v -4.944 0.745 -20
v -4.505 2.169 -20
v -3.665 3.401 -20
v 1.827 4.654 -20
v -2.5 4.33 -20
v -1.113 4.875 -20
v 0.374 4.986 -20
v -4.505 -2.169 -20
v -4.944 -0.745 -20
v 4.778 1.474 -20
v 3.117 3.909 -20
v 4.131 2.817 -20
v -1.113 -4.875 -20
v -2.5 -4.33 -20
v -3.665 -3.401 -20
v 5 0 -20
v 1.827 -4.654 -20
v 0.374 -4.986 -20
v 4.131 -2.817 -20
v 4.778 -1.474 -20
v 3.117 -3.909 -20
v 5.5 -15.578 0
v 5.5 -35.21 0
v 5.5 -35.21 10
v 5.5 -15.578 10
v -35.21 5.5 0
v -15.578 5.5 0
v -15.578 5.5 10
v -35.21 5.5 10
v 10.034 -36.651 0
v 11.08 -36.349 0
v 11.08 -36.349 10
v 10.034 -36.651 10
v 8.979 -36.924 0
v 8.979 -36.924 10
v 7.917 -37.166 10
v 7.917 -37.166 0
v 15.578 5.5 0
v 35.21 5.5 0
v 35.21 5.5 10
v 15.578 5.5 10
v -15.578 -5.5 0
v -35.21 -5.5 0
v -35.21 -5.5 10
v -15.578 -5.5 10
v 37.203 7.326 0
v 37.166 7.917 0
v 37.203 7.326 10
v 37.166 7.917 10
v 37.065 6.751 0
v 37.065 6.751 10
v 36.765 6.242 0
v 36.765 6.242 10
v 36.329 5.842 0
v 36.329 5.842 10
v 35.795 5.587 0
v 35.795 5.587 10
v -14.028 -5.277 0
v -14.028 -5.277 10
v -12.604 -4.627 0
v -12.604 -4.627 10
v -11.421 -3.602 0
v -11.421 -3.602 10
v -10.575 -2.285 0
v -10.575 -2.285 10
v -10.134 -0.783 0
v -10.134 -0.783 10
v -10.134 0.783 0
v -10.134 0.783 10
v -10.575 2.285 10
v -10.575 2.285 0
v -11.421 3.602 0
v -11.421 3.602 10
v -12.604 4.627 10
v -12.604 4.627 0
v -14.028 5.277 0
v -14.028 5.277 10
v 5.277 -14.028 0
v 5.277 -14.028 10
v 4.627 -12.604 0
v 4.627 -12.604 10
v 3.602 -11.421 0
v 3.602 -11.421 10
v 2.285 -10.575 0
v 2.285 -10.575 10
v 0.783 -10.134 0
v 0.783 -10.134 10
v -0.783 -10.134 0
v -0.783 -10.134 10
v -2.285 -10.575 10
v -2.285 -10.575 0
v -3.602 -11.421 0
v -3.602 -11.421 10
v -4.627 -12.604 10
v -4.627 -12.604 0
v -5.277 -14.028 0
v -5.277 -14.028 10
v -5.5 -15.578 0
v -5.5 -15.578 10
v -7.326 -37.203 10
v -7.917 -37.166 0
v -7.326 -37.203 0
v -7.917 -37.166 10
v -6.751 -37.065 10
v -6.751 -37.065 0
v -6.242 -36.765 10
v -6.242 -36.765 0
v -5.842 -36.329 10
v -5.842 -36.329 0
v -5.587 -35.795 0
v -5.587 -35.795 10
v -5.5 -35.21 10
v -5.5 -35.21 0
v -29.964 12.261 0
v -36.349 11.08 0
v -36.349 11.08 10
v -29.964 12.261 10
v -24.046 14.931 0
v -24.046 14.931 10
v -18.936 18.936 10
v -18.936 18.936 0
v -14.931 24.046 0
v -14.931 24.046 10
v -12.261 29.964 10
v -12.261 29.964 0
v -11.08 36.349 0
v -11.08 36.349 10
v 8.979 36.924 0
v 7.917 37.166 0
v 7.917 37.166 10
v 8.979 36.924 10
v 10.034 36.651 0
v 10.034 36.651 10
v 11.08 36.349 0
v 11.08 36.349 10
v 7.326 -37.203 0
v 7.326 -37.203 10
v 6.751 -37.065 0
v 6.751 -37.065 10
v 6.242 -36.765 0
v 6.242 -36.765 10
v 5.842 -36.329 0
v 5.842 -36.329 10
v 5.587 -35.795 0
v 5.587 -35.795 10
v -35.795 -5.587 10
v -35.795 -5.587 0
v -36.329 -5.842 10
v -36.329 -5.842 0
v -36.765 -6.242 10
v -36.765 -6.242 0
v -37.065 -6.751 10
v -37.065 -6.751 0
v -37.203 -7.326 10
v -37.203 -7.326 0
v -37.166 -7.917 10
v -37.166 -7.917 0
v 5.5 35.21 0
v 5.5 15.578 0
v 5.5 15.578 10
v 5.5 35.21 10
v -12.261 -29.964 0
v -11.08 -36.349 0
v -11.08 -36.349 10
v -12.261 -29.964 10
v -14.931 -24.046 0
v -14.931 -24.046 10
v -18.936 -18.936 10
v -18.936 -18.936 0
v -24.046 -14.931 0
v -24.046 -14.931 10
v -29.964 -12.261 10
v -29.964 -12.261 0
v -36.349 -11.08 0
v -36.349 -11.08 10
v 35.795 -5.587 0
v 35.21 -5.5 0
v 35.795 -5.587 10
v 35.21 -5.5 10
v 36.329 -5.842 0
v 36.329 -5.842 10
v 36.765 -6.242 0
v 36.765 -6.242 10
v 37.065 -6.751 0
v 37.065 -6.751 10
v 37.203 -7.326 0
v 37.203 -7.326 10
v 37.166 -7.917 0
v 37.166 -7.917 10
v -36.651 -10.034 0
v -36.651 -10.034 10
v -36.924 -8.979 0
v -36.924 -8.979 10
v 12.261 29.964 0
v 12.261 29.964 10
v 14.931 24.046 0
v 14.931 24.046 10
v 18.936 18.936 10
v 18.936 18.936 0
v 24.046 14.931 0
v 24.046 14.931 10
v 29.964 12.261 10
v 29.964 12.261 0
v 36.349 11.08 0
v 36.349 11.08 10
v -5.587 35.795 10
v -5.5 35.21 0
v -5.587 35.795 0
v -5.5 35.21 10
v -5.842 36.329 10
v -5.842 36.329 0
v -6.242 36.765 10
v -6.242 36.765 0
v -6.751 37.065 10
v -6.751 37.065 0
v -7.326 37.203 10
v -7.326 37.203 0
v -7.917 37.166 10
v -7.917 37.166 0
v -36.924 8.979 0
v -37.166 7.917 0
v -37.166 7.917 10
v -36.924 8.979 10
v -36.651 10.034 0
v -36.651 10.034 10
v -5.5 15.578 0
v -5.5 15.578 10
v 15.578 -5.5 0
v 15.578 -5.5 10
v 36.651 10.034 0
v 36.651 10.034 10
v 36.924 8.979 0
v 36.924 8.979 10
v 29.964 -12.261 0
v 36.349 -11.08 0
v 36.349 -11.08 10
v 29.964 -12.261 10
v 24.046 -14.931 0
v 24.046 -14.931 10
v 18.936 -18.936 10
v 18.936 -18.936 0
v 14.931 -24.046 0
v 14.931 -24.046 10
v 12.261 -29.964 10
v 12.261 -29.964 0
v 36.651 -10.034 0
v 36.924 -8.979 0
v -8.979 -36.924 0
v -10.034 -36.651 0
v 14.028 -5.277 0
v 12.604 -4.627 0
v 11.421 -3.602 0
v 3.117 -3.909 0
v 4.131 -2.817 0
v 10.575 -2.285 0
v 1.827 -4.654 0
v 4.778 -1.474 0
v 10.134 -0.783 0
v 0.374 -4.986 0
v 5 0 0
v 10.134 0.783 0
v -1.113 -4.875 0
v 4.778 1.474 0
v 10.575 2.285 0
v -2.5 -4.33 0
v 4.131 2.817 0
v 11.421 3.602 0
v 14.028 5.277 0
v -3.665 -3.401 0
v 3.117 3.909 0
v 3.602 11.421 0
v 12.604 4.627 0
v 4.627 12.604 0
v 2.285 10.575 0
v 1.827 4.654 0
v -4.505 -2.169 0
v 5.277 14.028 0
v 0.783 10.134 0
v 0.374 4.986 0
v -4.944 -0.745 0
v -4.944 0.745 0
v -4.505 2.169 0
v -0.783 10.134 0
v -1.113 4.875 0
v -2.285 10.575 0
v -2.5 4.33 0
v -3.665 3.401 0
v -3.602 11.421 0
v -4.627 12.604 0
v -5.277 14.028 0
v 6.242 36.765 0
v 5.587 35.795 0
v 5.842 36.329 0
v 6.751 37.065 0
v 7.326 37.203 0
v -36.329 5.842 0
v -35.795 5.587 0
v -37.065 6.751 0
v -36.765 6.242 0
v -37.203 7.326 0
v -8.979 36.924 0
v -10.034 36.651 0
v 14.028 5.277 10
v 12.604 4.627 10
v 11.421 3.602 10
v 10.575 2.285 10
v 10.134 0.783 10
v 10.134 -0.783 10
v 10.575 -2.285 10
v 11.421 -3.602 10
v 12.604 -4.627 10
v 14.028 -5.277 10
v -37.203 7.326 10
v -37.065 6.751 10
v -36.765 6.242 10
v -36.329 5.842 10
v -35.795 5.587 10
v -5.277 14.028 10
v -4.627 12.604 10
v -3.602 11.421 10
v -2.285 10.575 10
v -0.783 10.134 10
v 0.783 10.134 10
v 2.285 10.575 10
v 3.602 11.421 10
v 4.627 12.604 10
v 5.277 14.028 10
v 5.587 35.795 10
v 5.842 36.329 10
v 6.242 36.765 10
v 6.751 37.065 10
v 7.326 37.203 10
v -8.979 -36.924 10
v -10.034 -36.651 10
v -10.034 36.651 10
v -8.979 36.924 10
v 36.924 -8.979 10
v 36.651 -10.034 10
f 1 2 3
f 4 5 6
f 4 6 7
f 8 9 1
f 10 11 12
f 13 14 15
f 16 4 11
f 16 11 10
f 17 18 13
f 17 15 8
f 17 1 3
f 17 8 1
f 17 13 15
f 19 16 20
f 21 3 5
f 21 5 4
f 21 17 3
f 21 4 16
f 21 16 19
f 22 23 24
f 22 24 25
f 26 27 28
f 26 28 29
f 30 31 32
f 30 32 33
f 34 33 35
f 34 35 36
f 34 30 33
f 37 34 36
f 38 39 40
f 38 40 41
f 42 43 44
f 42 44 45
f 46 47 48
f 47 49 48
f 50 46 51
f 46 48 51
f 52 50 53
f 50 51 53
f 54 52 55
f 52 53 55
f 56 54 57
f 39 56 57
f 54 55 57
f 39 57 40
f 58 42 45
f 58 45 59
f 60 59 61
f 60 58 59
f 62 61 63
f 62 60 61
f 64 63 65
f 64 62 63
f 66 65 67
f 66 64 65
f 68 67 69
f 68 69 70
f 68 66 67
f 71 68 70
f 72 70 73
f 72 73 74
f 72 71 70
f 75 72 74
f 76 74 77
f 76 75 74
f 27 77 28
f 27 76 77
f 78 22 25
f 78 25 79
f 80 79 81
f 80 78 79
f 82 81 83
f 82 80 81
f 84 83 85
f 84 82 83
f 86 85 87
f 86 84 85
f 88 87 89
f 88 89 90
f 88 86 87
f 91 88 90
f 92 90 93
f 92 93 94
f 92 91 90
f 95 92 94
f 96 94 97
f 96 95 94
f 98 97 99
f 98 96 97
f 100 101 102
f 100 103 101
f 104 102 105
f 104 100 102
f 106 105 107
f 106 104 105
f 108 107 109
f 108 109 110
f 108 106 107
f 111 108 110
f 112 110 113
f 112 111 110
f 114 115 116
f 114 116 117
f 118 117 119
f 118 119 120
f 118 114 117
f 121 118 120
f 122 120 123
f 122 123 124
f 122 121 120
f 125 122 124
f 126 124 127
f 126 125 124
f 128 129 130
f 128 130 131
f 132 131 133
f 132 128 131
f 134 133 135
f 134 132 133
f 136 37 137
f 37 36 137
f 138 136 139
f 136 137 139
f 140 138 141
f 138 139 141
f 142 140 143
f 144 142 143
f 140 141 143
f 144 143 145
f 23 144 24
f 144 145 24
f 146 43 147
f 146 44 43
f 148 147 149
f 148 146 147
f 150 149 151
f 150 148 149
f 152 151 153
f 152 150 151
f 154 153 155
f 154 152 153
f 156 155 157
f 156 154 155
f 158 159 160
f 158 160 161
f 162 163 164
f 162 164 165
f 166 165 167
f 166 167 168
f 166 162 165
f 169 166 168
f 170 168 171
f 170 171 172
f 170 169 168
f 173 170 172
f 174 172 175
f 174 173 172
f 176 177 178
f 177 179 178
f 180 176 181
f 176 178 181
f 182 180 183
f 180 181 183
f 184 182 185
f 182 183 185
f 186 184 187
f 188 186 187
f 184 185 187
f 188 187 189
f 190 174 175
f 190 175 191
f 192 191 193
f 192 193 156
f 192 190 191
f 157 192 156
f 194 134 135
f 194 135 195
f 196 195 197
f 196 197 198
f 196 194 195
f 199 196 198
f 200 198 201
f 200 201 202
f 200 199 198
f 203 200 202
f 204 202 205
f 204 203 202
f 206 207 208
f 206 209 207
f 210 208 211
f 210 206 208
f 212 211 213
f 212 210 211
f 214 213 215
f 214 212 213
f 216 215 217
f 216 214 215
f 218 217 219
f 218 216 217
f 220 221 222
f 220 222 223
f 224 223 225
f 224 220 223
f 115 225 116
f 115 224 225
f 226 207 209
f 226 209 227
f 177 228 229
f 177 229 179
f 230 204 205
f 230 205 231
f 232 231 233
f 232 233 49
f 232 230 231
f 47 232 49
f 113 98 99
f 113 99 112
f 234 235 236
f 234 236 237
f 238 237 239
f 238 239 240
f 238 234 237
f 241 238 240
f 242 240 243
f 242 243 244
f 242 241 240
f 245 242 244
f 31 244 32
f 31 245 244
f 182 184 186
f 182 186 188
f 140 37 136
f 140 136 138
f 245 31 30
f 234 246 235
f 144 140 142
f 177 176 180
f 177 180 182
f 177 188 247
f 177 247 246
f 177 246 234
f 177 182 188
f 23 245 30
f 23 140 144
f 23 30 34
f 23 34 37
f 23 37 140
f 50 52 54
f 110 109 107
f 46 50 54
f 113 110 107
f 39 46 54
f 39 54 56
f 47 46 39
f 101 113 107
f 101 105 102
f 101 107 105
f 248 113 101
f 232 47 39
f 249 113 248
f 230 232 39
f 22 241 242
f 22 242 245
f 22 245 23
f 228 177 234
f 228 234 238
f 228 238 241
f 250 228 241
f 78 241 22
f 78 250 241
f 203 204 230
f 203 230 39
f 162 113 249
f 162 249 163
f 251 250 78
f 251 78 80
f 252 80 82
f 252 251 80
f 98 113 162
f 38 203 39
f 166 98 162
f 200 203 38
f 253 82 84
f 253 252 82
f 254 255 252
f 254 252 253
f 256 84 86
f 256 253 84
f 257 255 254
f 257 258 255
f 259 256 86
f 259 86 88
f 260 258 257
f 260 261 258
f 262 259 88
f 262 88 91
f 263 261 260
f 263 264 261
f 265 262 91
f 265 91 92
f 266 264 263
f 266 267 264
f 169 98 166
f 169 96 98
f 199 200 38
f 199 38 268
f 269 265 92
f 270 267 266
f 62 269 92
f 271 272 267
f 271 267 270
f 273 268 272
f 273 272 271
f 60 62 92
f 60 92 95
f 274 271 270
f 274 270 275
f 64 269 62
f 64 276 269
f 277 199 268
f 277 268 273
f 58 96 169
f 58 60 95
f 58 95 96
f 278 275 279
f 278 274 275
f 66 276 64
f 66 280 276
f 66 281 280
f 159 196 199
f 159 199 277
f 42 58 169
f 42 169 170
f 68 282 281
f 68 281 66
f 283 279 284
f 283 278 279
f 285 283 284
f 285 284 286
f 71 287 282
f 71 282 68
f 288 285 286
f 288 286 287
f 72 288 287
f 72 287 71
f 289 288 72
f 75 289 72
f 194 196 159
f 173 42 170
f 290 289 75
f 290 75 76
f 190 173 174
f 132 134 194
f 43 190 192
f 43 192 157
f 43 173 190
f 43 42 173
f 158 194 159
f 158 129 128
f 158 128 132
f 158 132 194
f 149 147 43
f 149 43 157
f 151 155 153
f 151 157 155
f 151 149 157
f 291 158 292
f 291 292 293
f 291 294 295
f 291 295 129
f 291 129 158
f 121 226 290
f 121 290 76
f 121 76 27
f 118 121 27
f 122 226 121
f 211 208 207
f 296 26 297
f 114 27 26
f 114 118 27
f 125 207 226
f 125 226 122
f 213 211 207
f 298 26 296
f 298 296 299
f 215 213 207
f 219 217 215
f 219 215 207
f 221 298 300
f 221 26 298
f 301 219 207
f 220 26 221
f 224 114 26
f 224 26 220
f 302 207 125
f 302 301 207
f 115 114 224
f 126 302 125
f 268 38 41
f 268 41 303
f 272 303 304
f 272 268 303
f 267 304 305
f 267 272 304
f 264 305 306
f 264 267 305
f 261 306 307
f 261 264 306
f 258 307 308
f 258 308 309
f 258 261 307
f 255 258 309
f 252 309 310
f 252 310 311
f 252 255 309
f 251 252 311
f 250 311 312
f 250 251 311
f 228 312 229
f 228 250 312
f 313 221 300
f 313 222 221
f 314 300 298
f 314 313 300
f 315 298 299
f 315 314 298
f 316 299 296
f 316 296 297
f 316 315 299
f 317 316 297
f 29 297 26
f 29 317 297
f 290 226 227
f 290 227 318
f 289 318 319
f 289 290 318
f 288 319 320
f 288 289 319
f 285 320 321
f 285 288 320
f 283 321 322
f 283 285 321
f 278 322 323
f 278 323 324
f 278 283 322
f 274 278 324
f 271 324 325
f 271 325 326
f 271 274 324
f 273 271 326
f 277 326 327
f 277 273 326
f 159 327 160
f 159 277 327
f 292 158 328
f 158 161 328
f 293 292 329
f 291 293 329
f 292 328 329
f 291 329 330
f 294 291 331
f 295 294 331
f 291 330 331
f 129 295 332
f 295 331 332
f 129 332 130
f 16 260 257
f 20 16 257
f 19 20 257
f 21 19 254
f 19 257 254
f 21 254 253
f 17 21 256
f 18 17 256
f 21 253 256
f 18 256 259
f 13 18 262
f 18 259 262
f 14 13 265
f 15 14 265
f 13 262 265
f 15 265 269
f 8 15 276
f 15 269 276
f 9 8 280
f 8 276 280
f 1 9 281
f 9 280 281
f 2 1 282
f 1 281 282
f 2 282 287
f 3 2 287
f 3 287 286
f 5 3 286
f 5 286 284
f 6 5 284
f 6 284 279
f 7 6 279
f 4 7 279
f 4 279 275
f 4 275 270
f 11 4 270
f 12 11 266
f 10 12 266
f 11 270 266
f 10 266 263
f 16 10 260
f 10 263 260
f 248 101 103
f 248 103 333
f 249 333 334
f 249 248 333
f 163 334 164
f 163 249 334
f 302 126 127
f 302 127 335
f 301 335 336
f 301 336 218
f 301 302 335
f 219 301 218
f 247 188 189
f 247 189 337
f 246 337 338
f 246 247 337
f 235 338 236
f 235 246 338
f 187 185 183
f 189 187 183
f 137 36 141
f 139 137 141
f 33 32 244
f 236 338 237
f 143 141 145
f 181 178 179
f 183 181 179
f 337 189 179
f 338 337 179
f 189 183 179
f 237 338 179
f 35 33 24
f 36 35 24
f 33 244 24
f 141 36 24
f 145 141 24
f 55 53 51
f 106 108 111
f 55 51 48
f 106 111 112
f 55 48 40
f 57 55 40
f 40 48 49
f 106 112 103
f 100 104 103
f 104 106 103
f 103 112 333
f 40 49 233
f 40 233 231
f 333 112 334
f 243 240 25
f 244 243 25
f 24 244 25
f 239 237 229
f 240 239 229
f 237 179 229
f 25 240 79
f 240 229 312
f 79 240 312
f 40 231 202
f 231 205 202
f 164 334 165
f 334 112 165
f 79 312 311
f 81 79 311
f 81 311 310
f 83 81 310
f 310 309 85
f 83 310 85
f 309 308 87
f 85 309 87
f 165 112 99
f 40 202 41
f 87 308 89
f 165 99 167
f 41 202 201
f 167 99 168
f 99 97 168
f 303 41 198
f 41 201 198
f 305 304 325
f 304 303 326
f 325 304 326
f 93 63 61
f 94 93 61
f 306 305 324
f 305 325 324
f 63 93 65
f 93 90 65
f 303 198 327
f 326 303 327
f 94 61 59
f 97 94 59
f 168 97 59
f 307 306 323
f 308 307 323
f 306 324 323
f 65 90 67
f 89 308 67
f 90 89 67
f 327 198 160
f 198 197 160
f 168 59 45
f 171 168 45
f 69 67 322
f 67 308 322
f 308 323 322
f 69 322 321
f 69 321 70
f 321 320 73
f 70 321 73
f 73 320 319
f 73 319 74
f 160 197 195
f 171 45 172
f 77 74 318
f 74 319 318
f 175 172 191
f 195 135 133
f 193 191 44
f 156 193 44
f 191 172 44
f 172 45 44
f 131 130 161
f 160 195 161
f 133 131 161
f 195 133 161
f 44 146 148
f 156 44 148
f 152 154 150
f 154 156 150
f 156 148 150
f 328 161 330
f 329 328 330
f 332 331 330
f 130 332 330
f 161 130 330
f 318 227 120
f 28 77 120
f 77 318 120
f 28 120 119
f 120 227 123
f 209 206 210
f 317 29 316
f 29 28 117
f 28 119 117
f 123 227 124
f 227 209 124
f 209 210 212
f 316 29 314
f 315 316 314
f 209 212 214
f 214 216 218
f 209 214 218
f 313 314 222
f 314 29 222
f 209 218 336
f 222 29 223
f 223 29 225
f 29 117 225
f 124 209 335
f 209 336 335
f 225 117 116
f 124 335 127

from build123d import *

# Parameters (mm, degrees)
SALIENTE_EXTRUIR1_DEPTH = 10
CROQUIS2_R              = 5
SALIENTE_EXTRUIR2_DEPTH = 20
REDONDEO1_R             = 2


with BuildPart() as part:
    # Croquis1 → Saliente-Extruir1 (new body)
    with BuildSketch(Plane.XY):
        with BuildLine():
            Line((-5.5, 37.599867021), (-5.5, 15.577785413))
            ThreePointArc((-5.5, 15.577785413), (0, 10.077785413), (5.5, 15.577785413))
            Line((5.5, 15.577785413), (5.5, 37.599867021))
            ThreePointArc((5.5, 37.599867021), (8.313819384, 37.079379812), (11.080493617, 36.348626676))
            ThreePointArc((11.080493617, 36.348626676), (18.9363196, 18.9363196), (36.348626676, 11.080493617))
            ThreePointArc((36.348626676, 11.080493617), (37.079379812, 8.313819384), (37.599867021, 5.5))
            Line((37.599867021, 5.5), (15.577785413, 5.5))
            ThreePointArc((15.577785413, 5.5), (10.077785413, 0), (15.577785413, -5.5))
            Line((15.577785413, -5.5), (37.599867021, -5.5))
            ThreePointArc((37.599867021, -5.5), (37.079379812, -8.313819384), (36.348626676, -11.080493617))
            ThreePointArc((36.348626676, -11.080493617), (18.9363196, -18.9363196), (11.080493617, -36.348626676))
            ThreePointArc((11.080493617, -36.348626676), (8.313819384, -37.079379812), (5.5, -37.599867021))
            Line((5.5, -37.599867021), (5.5, -15.577785413))
            ThreePointArc((5.5, -15.577785413), (0, -10.077785413), (-5.5, -15.577785413))
            Line((-5.5, -15.577785413), (-5.5, -37.599867021))
            ThreePointArc((-5.5, -37.599867021), (-8.313819384, -37.079379812), (-11.080493617, -36.348626676))
            ThreePointArc((-11.080493617, -36.348626676), (-18.9363196, -18.9363196), (-36.348626676, -11.080493617))
            ThreePointArc((-36.348626676, -11.080493617), (-37.079379812, -8.313819384), (-37.599867021, -5.5))
            Line((-37.599867021, -5.5), (-15.577785413, -5.5))
            ThreePointArc((-15.577785413, -5.5), (-10.077785413, 0), (-15.577785413, 5.5))
            Line((-15.577785413, 5.5), (-37.599867021, 5.5))
            ThreePointArc((-37.599867021, 5.5), (-37.079379812, 8.313819384), (-36.348626676, 11.080493617))
            ThreePointArc((-36.348626676, 11.080493617), (-18.9363196, 18.9363196), (-11.080493617, 36.348626676))
            ThreePointArc((-11.080493617, 36.348626676), (-8.313819384, 37.079379812), (-5.5, 37.599867021))
        make_face()
    extrude(amount=SALIENTE_EXTRUIR1_DEPTH)

    # Croquis2 → Saliente-Extruir2 (add)
    with BuildSketch(Plane(origin=(0, 0, 0), x_dir=(-1, 0, 0), z_dir=(0, 0, -1))):
        with Locations(Location((0, 0, 0), (0, 0, 180))):
            Circle(CROQUIS2_R)
    extrude(amount=SALIENTE_EXTRUIR2_DEPTH)

    # Redondeo1
    redondeo1_edges = [part.edges().sort_by_distance(p)[0] for p in [
        (-5.5, -37.599867021, 5),
        (-37.599867021, -5.5, 5),
        (-37.599867021, 5.5, 5),
        (-5.5, 37.599867021, 5),
        (5.5, 37.599867021, 5),
        (37.599867021, 5.5, 5),
        (37.599867021, -5.5, 5),
        (5.5, -37.599867021, 5),
    ]]
    fillet(redondeo1_edges, radius=REDONDEO1_R)


solid = part.part
